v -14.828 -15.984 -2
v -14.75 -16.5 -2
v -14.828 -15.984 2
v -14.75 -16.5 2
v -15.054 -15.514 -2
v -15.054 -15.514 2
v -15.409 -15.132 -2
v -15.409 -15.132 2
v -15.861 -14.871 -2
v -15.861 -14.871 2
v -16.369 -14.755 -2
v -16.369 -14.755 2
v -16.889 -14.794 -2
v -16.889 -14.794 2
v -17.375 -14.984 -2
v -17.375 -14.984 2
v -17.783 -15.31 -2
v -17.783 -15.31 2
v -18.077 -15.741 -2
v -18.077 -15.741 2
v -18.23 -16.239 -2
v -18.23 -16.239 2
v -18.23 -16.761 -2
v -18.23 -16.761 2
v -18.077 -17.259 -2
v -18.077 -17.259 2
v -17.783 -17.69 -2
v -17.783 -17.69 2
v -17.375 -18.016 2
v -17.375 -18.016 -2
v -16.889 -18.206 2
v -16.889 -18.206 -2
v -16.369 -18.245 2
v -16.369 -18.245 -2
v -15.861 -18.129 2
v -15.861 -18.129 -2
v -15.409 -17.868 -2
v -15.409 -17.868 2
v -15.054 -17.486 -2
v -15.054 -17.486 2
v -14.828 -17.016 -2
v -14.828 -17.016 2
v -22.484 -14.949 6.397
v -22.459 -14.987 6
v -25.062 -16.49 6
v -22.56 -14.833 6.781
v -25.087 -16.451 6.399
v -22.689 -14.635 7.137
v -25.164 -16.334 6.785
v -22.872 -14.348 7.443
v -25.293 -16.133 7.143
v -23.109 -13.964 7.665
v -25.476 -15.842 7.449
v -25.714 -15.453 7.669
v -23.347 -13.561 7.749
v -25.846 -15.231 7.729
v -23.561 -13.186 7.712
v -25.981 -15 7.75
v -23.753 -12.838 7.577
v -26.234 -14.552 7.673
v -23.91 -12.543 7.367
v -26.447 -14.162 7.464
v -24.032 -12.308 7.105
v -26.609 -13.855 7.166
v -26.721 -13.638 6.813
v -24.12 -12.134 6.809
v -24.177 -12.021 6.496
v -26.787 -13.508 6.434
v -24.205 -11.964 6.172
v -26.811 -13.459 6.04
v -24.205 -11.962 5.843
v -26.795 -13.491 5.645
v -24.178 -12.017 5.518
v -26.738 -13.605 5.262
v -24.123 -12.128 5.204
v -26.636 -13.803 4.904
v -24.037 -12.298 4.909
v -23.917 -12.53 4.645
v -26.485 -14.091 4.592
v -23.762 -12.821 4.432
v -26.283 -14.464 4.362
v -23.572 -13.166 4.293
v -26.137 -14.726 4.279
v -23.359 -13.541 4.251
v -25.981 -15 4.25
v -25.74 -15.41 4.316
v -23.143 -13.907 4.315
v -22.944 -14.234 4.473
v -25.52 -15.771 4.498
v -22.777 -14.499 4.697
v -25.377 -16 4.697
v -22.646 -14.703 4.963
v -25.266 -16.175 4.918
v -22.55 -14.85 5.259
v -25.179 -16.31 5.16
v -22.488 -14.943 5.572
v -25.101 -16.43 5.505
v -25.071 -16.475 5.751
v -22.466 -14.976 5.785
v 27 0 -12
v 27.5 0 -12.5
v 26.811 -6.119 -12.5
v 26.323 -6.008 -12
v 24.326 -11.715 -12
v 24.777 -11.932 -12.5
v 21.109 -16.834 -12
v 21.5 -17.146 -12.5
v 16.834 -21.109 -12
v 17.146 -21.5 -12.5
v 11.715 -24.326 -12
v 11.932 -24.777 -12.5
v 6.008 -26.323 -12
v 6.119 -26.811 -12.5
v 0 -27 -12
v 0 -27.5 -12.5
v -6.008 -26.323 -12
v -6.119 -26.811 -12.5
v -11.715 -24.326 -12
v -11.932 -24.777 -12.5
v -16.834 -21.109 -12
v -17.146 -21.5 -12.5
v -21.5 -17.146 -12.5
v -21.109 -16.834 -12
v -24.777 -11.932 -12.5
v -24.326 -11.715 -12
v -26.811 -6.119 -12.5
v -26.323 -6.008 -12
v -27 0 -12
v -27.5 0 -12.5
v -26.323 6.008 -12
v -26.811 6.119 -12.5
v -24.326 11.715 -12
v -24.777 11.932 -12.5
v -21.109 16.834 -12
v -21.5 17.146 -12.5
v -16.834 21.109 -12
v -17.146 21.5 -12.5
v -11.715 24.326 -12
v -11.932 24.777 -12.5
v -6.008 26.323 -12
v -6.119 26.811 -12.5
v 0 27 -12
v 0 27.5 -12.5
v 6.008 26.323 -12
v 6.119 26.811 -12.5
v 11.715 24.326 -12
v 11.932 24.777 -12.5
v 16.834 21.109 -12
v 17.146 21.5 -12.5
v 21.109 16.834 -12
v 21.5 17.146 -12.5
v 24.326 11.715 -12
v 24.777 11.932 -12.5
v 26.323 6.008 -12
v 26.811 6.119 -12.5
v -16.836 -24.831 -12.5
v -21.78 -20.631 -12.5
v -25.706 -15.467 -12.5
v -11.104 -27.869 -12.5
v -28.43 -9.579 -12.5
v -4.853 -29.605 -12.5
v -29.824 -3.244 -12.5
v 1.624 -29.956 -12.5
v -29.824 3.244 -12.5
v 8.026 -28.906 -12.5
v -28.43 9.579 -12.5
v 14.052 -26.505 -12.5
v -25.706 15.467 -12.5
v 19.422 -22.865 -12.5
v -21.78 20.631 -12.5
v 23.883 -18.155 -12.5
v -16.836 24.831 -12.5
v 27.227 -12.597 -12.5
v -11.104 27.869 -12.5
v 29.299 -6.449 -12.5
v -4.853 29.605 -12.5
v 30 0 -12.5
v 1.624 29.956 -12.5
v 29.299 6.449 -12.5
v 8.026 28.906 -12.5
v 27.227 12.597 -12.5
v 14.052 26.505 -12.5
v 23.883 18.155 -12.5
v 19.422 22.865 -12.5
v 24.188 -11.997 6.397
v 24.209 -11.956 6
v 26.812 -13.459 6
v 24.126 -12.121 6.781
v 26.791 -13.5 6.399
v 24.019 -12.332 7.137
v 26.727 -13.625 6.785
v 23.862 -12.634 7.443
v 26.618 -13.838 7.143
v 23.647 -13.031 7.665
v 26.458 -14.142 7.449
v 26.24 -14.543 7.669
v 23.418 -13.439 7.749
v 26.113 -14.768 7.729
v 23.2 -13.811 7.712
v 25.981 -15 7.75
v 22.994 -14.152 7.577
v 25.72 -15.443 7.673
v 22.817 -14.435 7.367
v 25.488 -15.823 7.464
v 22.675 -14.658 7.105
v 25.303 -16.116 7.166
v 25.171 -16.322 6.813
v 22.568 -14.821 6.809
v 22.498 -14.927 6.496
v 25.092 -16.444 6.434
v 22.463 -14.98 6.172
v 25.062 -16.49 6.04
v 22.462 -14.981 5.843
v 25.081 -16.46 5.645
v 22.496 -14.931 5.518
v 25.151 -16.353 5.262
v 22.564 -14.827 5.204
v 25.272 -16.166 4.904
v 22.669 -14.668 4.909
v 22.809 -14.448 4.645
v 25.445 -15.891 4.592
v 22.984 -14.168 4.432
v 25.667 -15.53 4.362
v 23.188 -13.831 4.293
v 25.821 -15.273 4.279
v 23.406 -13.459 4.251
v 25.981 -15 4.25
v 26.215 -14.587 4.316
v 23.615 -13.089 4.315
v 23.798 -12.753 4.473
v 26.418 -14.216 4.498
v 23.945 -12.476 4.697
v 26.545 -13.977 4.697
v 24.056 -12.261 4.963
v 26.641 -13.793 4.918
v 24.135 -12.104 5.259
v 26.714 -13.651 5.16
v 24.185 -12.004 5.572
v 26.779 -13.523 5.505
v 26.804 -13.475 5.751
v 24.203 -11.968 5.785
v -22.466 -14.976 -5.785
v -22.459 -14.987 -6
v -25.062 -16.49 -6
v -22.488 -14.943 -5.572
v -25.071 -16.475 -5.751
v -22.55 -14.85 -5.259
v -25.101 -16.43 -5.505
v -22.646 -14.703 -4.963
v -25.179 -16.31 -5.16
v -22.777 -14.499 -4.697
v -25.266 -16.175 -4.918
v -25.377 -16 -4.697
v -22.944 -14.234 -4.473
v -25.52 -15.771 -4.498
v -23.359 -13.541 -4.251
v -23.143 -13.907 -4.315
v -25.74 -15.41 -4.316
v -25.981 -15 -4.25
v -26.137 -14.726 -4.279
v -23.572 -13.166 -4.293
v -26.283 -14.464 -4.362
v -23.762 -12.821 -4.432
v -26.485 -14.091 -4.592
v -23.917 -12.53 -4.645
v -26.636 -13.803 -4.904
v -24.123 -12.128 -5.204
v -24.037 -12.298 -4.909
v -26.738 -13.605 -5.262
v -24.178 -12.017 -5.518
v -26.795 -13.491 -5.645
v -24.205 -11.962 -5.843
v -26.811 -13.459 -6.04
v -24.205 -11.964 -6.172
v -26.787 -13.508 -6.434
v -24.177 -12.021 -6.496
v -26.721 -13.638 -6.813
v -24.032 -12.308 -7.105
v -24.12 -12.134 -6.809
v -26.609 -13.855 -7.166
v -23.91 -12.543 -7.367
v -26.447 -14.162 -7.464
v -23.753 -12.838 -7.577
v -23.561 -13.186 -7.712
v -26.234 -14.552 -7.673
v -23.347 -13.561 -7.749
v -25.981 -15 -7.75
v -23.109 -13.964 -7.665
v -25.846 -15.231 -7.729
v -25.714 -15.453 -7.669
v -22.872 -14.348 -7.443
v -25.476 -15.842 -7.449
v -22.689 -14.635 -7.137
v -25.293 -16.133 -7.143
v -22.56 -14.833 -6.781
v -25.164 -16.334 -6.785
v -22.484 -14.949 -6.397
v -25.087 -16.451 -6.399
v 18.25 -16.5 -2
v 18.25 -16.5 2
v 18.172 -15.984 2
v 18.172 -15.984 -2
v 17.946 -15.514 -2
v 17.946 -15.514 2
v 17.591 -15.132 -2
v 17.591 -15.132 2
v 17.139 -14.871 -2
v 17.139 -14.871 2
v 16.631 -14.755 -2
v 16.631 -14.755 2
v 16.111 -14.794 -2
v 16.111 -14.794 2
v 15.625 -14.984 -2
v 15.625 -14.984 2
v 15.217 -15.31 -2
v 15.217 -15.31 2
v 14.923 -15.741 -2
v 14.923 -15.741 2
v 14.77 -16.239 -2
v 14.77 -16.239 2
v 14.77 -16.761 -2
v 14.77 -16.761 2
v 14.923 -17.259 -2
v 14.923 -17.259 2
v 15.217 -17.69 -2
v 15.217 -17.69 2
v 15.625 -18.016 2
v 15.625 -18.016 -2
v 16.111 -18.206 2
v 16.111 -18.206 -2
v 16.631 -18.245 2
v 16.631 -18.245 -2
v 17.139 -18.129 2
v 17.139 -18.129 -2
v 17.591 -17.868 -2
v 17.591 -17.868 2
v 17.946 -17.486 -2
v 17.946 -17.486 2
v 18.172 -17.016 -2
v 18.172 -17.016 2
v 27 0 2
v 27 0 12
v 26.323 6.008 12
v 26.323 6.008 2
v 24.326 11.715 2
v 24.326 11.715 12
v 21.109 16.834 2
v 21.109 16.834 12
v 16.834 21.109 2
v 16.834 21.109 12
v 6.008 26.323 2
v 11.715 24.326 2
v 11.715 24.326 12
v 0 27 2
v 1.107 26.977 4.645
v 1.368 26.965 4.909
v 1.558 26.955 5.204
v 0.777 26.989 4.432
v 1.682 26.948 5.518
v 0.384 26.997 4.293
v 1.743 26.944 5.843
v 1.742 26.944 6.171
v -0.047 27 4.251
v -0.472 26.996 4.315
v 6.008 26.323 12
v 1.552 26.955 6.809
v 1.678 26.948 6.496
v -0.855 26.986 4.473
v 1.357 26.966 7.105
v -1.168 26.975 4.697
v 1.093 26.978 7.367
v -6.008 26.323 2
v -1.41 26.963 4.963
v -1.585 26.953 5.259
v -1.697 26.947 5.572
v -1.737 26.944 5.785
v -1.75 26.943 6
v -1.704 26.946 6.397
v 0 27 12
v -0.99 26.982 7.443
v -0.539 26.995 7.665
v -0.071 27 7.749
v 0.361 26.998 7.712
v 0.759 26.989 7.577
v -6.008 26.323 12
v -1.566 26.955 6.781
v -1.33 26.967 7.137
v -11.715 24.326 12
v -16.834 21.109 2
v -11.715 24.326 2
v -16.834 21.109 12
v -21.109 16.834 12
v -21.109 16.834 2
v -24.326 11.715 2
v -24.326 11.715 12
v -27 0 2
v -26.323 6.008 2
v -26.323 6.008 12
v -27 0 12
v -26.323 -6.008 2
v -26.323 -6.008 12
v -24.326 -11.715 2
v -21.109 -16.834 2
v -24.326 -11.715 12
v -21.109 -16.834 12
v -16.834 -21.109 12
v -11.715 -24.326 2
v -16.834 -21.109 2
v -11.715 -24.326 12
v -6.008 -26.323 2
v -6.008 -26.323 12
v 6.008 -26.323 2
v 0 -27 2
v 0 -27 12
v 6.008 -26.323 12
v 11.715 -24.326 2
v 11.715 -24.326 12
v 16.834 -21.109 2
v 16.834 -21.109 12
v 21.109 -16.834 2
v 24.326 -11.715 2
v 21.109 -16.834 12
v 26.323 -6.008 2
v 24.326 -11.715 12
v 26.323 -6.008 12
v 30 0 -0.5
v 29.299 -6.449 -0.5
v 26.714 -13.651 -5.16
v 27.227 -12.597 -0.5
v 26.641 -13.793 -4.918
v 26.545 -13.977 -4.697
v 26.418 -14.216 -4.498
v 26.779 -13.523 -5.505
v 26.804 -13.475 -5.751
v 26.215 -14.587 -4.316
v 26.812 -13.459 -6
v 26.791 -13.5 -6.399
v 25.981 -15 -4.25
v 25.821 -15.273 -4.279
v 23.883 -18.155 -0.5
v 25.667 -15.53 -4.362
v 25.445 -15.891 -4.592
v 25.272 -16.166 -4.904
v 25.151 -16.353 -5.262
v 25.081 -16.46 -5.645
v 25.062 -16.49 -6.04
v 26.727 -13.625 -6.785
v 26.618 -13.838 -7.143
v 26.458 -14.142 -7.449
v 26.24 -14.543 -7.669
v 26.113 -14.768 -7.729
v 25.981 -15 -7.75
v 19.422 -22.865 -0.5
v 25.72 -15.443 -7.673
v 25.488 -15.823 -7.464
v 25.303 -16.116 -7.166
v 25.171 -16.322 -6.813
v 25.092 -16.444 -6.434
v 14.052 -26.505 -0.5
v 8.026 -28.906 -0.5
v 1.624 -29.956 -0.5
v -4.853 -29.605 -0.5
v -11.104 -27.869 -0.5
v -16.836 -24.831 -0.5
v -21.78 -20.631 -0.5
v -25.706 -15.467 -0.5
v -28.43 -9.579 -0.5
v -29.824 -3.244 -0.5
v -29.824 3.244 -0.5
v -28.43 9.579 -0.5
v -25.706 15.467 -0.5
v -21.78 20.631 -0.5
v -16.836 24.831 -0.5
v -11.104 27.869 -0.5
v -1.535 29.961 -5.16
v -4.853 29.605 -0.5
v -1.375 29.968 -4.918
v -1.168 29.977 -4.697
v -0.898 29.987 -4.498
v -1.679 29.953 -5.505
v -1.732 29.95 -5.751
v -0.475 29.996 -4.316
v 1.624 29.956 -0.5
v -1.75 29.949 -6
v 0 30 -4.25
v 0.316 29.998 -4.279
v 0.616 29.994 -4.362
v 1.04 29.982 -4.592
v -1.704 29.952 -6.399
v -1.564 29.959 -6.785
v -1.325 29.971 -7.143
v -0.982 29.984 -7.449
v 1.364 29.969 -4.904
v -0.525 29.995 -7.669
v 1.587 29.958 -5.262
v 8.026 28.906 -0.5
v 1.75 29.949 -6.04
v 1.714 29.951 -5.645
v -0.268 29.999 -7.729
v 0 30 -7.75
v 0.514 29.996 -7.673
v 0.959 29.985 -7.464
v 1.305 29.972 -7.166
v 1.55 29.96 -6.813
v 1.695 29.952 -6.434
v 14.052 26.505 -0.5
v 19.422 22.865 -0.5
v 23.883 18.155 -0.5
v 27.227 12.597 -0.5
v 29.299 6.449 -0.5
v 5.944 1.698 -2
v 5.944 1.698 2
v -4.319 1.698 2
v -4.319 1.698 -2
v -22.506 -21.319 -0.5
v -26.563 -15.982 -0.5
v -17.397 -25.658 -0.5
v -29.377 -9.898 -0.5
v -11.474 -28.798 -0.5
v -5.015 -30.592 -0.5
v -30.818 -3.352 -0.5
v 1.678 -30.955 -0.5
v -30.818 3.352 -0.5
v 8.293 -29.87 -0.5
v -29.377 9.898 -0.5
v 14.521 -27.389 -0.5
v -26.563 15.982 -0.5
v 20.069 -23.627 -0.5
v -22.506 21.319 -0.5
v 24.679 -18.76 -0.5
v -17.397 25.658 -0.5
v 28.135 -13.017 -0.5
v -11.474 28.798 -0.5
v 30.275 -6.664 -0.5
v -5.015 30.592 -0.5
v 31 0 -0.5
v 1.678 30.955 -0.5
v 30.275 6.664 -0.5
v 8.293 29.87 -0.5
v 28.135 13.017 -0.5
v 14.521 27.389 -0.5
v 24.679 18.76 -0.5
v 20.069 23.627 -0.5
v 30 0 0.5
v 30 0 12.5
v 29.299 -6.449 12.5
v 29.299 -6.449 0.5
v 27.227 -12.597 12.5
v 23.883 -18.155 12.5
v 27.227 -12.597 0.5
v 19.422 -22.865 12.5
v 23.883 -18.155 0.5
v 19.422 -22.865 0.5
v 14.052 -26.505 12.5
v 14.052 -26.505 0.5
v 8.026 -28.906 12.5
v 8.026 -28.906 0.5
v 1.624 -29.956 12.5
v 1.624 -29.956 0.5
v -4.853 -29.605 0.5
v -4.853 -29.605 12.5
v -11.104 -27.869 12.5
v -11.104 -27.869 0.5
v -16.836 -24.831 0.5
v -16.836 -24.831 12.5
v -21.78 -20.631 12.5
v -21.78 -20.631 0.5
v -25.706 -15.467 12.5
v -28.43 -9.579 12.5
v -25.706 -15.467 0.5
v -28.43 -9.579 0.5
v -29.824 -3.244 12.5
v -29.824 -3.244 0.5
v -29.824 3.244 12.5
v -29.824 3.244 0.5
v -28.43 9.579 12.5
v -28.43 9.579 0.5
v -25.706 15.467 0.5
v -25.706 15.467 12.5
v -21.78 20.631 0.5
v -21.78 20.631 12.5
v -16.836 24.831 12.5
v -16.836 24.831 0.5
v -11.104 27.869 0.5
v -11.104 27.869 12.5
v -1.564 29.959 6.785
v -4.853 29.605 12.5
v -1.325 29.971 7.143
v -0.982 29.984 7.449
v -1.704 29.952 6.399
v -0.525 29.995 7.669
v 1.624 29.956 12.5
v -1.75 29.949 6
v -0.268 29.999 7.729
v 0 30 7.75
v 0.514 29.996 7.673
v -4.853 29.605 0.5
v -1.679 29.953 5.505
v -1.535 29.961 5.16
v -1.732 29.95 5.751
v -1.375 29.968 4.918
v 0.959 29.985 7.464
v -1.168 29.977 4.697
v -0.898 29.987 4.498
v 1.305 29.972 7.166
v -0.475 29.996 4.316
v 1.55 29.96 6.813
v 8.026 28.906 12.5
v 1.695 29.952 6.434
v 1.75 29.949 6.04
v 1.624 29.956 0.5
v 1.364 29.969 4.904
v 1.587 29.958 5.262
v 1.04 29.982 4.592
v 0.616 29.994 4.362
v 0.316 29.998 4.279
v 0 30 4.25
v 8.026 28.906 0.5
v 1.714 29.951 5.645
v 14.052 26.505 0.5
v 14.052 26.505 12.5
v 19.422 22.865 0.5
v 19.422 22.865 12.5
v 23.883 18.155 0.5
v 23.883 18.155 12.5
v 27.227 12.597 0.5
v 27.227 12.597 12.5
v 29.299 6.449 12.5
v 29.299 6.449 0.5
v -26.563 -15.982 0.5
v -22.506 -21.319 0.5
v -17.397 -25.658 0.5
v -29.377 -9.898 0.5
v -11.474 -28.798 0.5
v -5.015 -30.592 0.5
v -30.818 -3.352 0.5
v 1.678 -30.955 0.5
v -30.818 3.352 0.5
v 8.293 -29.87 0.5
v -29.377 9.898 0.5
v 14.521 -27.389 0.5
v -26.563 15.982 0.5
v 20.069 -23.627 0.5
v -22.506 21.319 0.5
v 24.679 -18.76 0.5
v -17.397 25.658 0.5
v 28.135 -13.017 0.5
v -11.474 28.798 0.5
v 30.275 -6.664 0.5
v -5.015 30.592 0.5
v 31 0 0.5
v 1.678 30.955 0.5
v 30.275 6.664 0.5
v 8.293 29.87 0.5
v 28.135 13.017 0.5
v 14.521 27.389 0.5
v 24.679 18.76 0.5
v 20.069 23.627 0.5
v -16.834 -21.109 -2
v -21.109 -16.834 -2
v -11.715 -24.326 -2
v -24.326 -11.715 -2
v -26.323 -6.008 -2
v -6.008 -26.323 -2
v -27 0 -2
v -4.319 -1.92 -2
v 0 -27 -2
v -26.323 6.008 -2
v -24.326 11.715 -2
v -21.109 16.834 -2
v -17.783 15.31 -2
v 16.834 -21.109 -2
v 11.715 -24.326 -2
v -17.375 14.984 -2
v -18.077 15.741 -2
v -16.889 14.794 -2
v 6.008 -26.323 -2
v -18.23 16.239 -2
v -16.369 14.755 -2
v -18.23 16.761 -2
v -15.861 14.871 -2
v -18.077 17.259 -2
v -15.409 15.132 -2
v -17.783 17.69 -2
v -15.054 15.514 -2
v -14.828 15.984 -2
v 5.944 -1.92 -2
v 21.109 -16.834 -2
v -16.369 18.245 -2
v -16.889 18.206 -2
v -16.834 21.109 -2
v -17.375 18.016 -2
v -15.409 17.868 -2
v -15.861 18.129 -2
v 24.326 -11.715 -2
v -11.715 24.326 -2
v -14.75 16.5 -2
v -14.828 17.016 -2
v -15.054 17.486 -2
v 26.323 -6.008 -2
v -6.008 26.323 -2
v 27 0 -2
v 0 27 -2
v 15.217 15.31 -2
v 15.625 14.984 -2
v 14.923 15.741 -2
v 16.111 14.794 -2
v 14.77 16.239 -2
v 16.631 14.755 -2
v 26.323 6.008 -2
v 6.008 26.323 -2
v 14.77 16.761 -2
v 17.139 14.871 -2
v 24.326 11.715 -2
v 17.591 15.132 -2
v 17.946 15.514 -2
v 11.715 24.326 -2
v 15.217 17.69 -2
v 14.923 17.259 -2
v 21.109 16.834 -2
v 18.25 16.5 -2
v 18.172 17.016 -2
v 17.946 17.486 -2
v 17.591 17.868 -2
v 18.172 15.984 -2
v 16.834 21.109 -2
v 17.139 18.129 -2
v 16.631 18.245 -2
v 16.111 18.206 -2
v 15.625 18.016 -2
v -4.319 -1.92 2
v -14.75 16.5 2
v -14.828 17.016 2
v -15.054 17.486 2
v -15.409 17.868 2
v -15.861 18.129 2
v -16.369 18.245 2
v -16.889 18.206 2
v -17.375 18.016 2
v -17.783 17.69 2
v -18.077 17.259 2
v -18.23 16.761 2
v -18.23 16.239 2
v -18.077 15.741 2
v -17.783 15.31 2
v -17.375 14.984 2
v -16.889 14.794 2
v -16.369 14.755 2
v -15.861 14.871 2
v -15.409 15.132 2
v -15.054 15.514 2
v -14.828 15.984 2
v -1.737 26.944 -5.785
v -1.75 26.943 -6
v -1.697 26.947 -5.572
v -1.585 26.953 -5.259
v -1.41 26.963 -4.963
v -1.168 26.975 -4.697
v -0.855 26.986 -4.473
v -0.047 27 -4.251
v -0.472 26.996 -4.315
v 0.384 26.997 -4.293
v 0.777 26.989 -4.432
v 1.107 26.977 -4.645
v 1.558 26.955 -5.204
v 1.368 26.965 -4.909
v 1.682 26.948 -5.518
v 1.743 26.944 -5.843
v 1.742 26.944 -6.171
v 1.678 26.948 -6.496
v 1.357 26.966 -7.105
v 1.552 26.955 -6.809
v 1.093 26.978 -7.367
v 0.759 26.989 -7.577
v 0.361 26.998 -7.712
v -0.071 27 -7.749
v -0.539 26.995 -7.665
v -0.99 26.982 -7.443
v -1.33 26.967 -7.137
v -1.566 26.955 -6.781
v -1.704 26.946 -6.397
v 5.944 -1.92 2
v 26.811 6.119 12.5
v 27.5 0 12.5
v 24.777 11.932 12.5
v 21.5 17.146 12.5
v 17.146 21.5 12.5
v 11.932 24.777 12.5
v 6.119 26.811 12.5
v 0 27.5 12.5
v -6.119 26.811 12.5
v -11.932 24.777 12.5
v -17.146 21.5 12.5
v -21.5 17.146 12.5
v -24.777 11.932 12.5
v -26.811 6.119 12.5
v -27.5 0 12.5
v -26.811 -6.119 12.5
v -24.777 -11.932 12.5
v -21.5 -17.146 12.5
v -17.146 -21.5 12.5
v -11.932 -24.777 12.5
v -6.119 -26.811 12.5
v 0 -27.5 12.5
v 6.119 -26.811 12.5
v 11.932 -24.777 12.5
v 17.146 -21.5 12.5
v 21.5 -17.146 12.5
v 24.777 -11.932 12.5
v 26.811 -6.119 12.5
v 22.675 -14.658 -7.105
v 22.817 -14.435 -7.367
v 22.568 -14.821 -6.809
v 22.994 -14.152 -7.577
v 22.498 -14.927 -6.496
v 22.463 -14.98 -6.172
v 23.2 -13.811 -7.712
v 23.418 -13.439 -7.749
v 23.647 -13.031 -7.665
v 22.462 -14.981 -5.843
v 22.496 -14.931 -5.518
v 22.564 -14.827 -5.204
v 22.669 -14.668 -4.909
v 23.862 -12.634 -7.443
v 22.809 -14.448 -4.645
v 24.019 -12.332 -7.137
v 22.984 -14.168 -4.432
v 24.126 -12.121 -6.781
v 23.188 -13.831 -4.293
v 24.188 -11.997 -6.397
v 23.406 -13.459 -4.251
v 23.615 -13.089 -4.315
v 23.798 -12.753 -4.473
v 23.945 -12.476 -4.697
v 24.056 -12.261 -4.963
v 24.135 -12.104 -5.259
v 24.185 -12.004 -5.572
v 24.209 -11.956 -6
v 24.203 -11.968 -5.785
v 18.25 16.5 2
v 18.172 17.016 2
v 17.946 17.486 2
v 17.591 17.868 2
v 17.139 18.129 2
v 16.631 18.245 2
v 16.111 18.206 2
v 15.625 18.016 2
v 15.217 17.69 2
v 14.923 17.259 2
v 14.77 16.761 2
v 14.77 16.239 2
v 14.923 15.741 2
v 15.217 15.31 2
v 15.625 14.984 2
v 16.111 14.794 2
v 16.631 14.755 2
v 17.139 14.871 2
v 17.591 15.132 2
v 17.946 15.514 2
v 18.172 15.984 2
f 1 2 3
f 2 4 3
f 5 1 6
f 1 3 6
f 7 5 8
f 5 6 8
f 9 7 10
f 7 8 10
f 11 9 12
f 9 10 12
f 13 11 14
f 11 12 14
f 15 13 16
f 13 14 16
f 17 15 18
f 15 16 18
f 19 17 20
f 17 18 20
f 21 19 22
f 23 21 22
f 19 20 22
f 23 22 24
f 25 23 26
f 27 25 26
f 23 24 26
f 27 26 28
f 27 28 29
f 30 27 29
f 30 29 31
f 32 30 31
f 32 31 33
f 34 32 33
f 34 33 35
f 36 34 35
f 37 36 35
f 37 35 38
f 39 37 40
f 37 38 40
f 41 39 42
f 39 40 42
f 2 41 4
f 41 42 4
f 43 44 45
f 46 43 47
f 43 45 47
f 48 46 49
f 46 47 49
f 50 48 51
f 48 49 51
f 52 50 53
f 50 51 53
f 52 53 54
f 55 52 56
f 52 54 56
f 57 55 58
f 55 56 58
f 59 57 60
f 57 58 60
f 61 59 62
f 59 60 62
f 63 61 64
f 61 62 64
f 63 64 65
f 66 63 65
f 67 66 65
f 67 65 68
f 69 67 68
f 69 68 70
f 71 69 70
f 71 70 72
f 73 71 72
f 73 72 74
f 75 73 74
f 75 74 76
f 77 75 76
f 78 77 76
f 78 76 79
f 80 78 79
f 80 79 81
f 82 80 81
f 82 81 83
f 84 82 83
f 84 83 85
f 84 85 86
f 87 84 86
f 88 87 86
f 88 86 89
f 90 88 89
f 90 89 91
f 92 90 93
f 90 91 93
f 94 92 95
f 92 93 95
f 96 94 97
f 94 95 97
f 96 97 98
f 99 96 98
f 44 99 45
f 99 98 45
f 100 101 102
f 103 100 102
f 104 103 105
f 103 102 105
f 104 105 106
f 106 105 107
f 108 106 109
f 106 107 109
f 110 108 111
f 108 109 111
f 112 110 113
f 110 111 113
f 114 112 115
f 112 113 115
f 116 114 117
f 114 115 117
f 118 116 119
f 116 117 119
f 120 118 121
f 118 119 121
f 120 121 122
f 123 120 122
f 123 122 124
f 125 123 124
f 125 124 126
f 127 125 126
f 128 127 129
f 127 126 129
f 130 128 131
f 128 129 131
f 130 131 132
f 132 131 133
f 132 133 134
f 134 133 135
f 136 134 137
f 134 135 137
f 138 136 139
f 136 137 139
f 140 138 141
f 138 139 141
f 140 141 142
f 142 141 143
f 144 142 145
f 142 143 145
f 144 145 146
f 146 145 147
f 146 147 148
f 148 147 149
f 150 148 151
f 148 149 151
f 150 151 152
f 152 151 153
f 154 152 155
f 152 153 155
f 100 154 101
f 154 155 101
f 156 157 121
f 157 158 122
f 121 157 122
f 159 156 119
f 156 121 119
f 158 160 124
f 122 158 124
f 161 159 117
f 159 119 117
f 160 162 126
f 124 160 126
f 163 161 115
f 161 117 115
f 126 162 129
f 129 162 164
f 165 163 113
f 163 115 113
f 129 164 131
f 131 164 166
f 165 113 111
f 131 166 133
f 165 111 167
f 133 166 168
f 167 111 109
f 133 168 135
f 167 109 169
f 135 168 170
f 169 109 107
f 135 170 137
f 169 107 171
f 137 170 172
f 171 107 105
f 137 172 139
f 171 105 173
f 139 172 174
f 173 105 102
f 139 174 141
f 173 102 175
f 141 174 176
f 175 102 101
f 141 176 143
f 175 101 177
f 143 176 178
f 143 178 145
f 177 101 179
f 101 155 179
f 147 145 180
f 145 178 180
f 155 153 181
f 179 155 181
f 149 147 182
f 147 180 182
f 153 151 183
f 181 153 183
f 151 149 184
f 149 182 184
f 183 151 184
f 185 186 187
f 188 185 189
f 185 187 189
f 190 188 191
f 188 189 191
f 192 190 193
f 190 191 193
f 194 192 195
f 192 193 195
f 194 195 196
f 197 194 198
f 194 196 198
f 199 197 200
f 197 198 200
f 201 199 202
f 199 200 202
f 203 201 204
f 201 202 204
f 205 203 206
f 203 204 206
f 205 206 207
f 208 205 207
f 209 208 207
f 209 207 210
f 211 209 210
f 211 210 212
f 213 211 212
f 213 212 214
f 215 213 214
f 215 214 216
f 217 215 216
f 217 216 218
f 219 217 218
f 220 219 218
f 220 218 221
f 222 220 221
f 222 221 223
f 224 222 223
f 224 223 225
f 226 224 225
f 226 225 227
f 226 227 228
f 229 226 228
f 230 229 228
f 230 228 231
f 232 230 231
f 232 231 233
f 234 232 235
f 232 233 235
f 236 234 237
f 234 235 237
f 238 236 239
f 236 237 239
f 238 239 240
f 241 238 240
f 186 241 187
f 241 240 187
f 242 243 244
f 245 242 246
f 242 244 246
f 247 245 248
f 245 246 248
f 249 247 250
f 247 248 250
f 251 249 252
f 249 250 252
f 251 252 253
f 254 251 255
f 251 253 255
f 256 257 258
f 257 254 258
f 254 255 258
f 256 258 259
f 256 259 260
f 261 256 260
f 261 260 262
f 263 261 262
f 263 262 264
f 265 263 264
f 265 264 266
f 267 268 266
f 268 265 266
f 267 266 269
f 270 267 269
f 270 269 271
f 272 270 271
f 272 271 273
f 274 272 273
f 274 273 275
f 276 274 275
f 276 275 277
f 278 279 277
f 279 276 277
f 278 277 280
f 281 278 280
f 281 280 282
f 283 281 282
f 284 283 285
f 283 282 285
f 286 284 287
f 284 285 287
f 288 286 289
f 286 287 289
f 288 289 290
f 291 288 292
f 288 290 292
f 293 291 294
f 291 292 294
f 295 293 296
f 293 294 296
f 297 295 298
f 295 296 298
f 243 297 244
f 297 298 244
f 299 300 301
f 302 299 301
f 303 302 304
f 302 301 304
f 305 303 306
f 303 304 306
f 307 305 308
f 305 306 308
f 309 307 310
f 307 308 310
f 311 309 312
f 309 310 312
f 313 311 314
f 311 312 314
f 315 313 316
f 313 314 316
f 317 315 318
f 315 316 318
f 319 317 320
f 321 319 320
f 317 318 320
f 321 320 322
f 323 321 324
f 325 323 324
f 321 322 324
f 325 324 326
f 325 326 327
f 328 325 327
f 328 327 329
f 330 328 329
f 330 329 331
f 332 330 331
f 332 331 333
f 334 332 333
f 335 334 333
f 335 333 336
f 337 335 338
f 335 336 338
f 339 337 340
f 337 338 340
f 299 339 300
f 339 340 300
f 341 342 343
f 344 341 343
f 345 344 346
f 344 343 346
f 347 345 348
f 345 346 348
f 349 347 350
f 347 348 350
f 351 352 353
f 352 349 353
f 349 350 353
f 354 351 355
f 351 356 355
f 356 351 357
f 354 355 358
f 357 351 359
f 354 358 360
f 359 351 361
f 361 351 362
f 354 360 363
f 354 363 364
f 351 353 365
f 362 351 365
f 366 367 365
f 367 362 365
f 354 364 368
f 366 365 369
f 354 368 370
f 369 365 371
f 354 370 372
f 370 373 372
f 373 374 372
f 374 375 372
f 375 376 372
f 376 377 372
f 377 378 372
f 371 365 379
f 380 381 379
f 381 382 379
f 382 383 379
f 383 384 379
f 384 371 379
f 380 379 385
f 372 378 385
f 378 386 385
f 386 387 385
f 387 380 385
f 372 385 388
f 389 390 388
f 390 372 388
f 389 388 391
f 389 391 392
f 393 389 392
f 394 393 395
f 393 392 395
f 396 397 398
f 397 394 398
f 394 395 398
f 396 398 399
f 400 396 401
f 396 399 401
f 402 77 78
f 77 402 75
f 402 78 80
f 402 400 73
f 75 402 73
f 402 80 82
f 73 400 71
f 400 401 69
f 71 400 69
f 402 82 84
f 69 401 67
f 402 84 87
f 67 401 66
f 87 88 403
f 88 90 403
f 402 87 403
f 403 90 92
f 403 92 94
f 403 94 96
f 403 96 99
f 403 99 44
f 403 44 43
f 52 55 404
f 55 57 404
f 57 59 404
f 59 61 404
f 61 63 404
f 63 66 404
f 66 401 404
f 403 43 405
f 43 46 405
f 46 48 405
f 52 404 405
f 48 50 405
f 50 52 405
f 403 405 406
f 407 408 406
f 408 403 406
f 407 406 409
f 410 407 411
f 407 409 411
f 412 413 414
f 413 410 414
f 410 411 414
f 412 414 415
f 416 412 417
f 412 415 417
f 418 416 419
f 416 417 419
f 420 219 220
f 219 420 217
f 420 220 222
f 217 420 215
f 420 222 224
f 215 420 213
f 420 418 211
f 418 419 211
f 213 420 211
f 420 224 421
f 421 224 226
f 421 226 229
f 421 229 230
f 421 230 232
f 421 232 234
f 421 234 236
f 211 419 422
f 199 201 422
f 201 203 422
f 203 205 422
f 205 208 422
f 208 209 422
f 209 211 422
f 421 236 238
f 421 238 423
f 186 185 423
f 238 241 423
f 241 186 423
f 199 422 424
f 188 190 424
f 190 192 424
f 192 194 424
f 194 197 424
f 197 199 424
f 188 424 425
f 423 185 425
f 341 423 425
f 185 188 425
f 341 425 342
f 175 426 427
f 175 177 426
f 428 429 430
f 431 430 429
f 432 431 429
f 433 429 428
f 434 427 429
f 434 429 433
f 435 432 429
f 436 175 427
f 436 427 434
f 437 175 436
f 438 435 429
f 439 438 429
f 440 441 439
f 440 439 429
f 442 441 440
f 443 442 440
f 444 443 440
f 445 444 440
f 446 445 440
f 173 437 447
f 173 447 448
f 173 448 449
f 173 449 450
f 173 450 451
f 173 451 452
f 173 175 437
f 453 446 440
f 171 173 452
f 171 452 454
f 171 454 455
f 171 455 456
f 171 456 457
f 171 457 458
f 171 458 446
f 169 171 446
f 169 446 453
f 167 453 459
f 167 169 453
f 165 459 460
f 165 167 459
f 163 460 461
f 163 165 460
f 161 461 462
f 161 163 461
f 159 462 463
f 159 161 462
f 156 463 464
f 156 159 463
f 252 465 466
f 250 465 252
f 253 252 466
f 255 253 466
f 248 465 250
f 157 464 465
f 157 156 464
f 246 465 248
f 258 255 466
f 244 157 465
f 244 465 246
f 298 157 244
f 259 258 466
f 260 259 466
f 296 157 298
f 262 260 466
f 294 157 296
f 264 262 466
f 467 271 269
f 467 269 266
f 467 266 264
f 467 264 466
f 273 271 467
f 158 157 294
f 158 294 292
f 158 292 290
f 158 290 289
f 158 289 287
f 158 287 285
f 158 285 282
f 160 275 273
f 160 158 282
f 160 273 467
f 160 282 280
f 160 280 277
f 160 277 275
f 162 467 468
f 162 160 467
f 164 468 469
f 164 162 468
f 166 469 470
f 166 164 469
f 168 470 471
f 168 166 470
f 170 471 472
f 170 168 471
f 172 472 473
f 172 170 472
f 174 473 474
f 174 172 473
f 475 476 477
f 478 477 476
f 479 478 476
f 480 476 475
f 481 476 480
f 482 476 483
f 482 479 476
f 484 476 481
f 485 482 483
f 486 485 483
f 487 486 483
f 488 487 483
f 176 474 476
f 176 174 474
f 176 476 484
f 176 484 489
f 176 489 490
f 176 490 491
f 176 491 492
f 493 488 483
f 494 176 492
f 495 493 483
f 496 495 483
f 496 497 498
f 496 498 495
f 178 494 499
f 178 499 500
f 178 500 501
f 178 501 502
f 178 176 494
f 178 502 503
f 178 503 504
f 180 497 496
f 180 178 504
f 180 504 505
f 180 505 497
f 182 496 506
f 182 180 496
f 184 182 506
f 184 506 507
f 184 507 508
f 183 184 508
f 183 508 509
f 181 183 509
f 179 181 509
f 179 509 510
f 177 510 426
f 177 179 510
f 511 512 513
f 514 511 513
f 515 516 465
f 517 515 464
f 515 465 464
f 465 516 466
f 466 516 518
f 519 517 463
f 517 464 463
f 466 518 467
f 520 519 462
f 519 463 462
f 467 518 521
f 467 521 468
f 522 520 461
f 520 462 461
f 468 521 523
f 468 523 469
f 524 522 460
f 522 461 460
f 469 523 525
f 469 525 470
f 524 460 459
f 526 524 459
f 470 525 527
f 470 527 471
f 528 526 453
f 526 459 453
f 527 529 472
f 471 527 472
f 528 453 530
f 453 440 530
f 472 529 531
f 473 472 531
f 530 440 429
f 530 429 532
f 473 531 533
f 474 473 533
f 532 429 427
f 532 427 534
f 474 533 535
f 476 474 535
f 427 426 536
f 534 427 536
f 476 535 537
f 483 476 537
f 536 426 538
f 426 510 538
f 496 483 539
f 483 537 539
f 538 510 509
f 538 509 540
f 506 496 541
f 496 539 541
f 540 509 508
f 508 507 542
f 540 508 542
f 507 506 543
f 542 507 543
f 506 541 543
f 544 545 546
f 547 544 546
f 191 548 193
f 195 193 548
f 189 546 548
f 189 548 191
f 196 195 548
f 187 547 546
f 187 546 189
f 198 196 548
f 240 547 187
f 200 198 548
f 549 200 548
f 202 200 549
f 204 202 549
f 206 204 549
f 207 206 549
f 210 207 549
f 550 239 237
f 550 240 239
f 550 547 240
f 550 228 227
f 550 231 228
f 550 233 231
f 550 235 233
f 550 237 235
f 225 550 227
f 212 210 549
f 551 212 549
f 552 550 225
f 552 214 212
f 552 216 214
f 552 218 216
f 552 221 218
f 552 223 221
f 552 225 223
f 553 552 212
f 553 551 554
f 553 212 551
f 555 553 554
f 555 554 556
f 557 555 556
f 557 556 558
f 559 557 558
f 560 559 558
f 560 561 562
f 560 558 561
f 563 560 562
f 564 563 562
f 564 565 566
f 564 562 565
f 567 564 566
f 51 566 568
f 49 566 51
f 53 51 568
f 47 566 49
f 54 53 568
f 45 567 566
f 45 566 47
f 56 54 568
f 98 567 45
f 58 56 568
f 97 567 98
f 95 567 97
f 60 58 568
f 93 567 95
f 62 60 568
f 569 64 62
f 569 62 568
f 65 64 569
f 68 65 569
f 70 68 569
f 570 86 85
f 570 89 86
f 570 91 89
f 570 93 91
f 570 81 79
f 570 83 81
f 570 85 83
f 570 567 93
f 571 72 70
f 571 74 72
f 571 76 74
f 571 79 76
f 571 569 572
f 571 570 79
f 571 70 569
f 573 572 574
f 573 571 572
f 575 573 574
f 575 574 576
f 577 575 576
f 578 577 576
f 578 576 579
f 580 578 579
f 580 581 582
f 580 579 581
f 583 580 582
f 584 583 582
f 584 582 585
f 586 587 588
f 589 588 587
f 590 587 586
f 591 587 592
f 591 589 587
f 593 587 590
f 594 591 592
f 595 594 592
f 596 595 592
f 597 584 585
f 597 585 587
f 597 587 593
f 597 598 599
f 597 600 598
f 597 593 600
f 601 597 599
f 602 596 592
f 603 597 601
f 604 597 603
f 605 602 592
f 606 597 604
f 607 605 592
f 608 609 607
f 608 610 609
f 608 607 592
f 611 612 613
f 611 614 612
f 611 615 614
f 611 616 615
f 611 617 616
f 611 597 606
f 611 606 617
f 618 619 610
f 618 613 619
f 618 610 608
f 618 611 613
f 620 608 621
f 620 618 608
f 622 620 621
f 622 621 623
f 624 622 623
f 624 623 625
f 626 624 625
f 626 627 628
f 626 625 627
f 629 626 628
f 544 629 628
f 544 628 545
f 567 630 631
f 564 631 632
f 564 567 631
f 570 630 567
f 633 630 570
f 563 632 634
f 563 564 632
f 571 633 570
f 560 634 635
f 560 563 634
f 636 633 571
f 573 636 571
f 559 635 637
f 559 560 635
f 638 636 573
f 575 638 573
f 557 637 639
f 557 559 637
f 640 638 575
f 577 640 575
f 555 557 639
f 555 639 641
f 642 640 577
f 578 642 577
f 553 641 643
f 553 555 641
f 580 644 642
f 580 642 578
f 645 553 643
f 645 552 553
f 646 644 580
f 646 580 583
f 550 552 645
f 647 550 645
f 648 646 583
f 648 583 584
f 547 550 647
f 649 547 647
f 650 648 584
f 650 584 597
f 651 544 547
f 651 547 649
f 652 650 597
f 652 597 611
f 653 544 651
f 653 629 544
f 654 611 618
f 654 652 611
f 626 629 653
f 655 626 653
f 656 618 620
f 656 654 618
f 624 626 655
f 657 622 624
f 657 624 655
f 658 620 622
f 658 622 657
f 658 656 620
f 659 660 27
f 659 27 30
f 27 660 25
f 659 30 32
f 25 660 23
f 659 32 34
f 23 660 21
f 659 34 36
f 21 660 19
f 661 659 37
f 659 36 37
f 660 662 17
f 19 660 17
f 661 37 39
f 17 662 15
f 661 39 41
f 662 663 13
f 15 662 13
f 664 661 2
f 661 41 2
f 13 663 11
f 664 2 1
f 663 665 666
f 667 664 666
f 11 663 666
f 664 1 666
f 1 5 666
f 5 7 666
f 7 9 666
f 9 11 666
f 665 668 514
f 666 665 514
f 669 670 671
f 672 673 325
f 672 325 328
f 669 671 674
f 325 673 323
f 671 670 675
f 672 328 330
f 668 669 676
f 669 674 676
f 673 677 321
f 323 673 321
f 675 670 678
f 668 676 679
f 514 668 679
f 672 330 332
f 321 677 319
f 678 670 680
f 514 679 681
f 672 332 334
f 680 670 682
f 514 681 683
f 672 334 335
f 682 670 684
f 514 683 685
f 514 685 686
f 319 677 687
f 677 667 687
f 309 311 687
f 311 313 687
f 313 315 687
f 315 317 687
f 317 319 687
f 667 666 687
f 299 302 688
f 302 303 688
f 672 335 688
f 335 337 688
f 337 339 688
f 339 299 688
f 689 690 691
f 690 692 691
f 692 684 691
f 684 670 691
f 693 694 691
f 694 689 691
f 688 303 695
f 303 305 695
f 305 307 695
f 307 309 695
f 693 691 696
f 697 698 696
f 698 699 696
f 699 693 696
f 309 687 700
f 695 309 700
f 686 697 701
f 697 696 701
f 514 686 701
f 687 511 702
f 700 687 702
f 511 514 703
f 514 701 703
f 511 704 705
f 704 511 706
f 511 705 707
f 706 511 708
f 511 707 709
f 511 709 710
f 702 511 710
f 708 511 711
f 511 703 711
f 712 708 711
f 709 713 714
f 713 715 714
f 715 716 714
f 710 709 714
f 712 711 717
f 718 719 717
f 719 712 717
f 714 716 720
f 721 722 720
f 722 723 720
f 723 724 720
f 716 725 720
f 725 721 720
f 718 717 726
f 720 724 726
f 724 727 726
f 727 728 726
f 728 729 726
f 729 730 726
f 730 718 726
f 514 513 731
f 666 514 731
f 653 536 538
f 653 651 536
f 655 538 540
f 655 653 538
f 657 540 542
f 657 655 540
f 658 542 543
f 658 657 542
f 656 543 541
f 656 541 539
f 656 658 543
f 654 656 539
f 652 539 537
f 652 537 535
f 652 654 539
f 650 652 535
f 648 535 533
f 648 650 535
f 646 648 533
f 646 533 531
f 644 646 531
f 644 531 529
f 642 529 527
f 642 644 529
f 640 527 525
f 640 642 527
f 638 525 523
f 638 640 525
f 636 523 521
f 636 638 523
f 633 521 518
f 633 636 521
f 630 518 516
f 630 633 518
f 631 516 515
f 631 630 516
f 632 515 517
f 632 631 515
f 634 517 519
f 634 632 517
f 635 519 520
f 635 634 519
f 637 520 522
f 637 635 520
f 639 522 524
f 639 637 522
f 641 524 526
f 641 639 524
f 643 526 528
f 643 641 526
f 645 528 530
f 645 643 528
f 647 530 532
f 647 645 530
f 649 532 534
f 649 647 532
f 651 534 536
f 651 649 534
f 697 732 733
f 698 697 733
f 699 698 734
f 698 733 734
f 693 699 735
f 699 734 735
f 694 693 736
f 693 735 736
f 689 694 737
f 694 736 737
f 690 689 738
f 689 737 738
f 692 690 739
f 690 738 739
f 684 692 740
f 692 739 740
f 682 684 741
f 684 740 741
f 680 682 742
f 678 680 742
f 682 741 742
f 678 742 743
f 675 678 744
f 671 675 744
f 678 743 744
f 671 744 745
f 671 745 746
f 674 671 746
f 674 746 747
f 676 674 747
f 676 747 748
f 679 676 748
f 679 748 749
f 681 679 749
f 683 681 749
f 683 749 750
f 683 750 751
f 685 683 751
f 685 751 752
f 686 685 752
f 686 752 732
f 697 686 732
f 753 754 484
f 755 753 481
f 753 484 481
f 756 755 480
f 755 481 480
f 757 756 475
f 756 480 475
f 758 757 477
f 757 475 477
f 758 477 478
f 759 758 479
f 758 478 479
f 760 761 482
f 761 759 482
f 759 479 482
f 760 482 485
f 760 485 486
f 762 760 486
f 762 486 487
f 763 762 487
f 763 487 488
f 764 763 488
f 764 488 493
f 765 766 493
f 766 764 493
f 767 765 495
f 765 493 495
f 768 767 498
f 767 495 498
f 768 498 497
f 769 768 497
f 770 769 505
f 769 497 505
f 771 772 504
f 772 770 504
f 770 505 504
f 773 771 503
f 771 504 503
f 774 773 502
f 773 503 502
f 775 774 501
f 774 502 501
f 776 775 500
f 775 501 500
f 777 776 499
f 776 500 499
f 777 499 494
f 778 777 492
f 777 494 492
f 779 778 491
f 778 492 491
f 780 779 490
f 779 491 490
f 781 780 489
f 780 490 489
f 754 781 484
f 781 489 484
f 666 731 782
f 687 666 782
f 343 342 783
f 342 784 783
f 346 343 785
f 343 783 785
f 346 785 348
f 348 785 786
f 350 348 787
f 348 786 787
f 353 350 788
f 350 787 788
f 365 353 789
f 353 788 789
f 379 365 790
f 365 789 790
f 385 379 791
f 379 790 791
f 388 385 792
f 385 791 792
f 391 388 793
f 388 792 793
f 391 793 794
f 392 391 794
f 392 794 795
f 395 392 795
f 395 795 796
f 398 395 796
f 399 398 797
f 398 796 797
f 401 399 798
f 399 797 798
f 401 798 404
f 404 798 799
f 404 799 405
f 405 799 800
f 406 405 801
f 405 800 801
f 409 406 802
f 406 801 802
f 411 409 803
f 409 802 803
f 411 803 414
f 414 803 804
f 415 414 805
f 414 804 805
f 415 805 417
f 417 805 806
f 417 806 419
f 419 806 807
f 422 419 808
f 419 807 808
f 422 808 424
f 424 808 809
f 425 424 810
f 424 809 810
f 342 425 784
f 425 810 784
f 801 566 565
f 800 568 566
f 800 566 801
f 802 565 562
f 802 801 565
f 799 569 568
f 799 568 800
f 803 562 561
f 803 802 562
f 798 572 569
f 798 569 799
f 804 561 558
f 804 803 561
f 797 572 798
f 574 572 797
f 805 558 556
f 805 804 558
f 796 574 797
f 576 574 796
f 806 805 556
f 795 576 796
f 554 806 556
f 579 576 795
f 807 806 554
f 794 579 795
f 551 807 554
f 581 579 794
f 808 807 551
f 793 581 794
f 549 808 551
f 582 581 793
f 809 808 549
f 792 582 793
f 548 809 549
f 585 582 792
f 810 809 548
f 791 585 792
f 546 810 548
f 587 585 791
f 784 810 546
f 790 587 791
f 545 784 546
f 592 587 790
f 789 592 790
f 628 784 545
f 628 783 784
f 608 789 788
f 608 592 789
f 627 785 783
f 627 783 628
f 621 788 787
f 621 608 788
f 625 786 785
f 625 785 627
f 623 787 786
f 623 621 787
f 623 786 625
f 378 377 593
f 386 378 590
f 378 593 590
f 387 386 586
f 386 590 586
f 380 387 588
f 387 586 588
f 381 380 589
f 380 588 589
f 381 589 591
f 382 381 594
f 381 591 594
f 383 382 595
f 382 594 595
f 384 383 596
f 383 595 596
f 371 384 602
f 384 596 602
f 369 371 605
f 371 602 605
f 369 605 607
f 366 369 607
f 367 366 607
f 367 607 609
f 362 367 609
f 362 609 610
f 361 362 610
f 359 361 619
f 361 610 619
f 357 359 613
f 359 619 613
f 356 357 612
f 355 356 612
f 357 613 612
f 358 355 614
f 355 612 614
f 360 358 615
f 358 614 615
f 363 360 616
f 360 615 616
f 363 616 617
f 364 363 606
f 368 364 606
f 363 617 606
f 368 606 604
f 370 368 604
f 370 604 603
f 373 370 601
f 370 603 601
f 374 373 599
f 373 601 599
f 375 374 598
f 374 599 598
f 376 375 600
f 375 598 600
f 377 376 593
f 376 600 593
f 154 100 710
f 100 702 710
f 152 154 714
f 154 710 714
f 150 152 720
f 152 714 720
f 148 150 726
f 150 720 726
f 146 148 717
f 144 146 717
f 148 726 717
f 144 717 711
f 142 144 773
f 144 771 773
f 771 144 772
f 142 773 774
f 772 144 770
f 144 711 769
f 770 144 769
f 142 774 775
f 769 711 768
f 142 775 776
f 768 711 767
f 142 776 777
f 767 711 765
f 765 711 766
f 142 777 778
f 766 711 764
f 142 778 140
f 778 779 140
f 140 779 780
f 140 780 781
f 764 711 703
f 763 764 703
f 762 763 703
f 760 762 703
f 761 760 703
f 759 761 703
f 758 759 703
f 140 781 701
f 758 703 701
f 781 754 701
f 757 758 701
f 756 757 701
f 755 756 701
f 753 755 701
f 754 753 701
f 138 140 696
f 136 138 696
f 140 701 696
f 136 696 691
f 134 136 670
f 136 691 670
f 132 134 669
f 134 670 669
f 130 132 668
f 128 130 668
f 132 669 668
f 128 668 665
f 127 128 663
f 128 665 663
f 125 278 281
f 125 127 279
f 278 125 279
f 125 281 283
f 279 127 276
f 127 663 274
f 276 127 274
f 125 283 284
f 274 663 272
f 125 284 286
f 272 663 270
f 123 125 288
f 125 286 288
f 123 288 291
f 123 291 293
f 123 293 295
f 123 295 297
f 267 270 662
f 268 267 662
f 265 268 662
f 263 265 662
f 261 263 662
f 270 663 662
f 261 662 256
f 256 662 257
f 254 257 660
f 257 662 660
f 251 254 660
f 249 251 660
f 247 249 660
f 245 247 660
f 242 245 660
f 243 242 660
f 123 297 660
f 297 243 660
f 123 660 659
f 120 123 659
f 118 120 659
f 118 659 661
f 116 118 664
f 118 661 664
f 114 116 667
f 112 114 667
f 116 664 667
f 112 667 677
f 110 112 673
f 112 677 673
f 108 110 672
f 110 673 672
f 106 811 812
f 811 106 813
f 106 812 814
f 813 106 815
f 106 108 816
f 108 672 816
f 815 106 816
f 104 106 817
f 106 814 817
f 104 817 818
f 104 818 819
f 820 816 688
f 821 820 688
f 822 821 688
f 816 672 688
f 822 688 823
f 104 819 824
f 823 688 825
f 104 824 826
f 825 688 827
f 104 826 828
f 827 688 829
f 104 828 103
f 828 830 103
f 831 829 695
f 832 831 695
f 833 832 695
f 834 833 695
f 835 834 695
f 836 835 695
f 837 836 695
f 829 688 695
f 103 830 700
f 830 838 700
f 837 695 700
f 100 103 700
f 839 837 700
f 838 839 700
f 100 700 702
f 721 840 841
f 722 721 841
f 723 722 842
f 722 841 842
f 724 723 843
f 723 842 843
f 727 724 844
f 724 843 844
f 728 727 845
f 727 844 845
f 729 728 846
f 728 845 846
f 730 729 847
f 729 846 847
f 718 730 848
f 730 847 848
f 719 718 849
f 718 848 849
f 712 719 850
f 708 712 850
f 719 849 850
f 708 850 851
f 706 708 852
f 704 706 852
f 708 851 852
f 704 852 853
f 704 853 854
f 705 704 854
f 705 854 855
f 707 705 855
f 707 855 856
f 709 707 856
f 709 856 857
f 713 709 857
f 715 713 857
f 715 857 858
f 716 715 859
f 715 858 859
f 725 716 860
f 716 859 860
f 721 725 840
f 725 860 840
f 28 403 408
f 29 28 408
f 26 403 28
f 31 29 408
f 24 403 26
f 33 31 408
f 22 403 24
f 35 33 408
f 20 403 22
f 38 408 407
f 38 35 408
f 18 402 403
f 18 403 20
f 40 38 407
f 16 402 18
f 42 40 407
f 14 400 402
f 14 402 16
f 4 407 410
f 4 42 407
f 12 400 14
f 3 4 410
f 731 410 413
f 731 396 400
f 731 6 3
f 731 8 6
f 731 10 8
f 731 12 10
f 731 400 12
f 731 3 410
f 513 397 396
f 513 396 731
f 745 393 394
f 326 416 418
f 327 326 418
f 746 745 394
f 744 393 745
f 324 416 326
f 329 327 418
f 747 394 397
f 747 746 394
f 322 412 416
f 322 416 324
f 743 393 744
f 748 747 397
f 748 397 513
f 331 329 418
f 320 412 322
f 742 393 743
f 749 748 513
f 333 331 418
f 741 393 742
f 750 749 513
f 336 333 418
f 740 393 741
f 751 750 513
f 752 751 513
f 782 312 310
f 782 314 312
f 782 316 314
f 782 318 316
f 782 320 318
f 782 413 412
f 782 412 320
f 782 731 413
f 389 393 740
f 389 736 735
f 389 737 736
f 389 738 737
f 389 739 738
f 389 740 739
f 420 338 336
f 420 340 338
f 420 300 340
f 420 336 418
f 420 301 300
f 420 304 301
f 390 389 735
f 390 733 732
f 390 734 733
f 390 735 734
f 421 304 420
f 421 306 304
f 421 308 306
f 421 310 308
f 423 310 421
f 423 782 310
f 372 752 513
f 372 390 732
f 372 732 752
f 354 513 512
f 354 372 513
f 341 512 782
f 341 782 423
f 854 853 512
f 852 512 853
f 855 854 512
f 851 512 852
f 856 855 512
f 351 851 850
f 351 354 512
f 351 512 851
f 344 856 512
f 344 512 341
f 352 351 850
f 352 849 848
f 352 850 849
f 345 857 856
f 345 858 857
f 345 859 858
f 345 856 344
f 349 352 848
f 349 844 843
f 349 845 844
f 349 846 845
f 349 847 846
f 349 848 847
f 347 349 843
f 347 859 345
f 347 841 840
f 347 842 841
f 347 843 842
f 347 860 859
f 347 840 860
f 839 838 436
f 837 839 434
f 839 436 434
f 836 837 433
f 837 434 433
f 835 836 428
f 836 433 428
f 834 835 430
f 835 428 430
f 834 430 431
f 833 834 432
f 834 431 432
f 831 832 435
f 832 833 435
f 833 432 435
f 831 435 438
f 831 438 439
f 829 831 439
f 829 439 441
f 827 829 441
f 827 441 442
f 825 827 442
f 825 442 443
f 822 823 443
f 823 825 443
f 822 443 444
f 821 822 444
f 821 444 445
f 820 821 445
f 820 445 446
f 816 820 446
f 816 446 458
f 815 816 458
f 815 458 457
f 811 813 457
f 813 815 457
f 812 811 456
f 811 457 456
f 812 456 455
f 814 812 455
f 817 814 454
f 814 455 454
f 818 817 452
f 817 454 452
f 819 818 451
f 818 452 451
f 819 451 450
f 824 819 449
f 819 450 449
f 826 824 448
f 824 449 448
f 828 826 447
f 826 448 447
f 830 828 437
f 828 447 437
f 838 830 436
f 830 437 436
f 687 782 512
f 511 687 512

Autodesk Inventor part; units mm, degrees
ref_plane "YZ Plane" through (0, 0, 0) normal (1, 0, 0) x (0, 1, 0)
ref_plane "XZ Plane" through (0, 0, 0) normal (0, 1, 0) x (-1, 0, 0)
sketch "Skizze1" plane through (0, 0, 0) normal (0, 0, 1) x (1, 0, 0)
  circle A0 centre (0, 0) radius 30
  circle A1 centre (0, 0) radius 27
  dimension "d0" = 60
  dimension "d1" = 54
extrude "Extrusion1" add sketch "Skizze1" along normal mid plane 25
ref_plane "Arbeitsebene1" through (0, 0, 6) normal (0, 0, 1) x (1, 0, 0)
sketch "Skizze2" plane through (0, 0, 6) normal (0, 0, 1) x (1, 0, 0)
  line L0 (0, 39.0372) -> (0, -37.5893) construction
  circle A0 centre (0, 0) radius 30 construction
  point P0 (0, 30)
ref_plane "Arbeitsebene2" through (0, 30, 6) normal (0, 1, 0) x (-1, 0, 0)
sketch "Skizze3" plane through (0, 30, 6) normal (0, 1, 0) x (-1, 0, 0)
  circle A0 centre (0, 0) radius 1.75
  point P0 (0, -6)
  dimension "d5" = 3.5
extrude "Extrusion2" cut sketch "Skizze3" against normal blind 5
pattern_circular "Runde Anordnung1" count 3 over 360 about axis through (0, 0, -10) along (0, 0, 1) of "Extrusion2"
mirror "Spiegeln1" about plane through (0, 0, 0) normal (0, 0, 1) of "Extrusion2", "Runde Anordnung1"
chamfer "Fase1" distance 0.5 angle 45 2 edges at (-27, 0, 12.5) (-27, 0, -12.5)
sketch "Skizze5" plane through (0, 0, 0) normal (0, 0, 1) x (1, 0, 0)
  circle A0 centre (0, 0) radius 27
  line L0 (-4.3192, -1.9196) -> (5.9435, -1.9196)
  line L1 (5.9435, -1.9196) -> (5.9435, 1.6981)
  line L2 (5.9435, 1.6981) -> (-4.3192, 1.6981)
  line L3 (-4.3192, 1.6981) -> (-4.3192, -1.9196)
extrude "Extrusion4" add sketch "Skizze5" along normal mid plane 4
sketch "Skizze4" plane through (0, 0, 0) normal (0, 0, 1) x (1, 0, 0)
  line L0 (0, 34.5644) -> (0, -38.5024) construction
  line L1 (-38.0901, 0) -> (52.3904, 0) construction
  line L2 (-34.7368, 16.5) -> (36.624, 16.5) construction
  line L3 (-36.0898, -16.5) -> (37.8594, -16.5) construction
  line L4 (16.5, 35.2115) -> (16.5, -32.6782) construction
  line L5 (-16.5, 34.5644) -> (-16.5, -34.6196) construction
  circle A0 centre (-16.5, 16.5) radius 1.75
  circle A1 centre (16.5, 16.5) radius 1.75
  circle A2 centre (-16.5, -16.5) radius 1.75
  circle A3 centre (16.5, -16.5) radius 1.75
  circle A4 centre (-16.5, 16.5) radius 3.6693
  circle A5 centre (16.5, 16.5) radius 3.7169
  circle A6 centre (16.5, -16.5) radius 3.6667
  circle A7 centre (-16.5, -16.5) radius 3.6675
  point P0 (0, 0)
  dimension "d14" = 33
  dimension "d15" = 33
  dimension "d16" = 3.5
  dimension "d17" = 3.5
  dimension "d18" = 3.5
  dimension "d19" = 3.5
extrude "Extrusion3" add sketch "Skizze4" along normal mid plane 4
extrude "Extrusion5" cut sketch "Skizze4" against normal mid plane 4 contours A0 | A1 | A2 | A3
sketch "Skizze6" plane through (0, 0, 0) normal (0, 0, 1) x (1, 0, 0)
  circle A0 centre (0, 0) radius 31
  circle A1 centre (0, 0) radius 29
  dimension "d27" = 62
  dimension "d28" = 58
extrude "Extrusion6" add sketch "Skizze6" along normal mid plane 1
ref_plane "Arbeitsebene3" through (0, 0, -6) normal (0, 0, 1) x (1, 0, 0)
ref_plane "Arbeitsebene4" through (0, 30, -6) normal (0, -1, 0) x (-1, 0, 0)
properties part number "_3D-Druck"
